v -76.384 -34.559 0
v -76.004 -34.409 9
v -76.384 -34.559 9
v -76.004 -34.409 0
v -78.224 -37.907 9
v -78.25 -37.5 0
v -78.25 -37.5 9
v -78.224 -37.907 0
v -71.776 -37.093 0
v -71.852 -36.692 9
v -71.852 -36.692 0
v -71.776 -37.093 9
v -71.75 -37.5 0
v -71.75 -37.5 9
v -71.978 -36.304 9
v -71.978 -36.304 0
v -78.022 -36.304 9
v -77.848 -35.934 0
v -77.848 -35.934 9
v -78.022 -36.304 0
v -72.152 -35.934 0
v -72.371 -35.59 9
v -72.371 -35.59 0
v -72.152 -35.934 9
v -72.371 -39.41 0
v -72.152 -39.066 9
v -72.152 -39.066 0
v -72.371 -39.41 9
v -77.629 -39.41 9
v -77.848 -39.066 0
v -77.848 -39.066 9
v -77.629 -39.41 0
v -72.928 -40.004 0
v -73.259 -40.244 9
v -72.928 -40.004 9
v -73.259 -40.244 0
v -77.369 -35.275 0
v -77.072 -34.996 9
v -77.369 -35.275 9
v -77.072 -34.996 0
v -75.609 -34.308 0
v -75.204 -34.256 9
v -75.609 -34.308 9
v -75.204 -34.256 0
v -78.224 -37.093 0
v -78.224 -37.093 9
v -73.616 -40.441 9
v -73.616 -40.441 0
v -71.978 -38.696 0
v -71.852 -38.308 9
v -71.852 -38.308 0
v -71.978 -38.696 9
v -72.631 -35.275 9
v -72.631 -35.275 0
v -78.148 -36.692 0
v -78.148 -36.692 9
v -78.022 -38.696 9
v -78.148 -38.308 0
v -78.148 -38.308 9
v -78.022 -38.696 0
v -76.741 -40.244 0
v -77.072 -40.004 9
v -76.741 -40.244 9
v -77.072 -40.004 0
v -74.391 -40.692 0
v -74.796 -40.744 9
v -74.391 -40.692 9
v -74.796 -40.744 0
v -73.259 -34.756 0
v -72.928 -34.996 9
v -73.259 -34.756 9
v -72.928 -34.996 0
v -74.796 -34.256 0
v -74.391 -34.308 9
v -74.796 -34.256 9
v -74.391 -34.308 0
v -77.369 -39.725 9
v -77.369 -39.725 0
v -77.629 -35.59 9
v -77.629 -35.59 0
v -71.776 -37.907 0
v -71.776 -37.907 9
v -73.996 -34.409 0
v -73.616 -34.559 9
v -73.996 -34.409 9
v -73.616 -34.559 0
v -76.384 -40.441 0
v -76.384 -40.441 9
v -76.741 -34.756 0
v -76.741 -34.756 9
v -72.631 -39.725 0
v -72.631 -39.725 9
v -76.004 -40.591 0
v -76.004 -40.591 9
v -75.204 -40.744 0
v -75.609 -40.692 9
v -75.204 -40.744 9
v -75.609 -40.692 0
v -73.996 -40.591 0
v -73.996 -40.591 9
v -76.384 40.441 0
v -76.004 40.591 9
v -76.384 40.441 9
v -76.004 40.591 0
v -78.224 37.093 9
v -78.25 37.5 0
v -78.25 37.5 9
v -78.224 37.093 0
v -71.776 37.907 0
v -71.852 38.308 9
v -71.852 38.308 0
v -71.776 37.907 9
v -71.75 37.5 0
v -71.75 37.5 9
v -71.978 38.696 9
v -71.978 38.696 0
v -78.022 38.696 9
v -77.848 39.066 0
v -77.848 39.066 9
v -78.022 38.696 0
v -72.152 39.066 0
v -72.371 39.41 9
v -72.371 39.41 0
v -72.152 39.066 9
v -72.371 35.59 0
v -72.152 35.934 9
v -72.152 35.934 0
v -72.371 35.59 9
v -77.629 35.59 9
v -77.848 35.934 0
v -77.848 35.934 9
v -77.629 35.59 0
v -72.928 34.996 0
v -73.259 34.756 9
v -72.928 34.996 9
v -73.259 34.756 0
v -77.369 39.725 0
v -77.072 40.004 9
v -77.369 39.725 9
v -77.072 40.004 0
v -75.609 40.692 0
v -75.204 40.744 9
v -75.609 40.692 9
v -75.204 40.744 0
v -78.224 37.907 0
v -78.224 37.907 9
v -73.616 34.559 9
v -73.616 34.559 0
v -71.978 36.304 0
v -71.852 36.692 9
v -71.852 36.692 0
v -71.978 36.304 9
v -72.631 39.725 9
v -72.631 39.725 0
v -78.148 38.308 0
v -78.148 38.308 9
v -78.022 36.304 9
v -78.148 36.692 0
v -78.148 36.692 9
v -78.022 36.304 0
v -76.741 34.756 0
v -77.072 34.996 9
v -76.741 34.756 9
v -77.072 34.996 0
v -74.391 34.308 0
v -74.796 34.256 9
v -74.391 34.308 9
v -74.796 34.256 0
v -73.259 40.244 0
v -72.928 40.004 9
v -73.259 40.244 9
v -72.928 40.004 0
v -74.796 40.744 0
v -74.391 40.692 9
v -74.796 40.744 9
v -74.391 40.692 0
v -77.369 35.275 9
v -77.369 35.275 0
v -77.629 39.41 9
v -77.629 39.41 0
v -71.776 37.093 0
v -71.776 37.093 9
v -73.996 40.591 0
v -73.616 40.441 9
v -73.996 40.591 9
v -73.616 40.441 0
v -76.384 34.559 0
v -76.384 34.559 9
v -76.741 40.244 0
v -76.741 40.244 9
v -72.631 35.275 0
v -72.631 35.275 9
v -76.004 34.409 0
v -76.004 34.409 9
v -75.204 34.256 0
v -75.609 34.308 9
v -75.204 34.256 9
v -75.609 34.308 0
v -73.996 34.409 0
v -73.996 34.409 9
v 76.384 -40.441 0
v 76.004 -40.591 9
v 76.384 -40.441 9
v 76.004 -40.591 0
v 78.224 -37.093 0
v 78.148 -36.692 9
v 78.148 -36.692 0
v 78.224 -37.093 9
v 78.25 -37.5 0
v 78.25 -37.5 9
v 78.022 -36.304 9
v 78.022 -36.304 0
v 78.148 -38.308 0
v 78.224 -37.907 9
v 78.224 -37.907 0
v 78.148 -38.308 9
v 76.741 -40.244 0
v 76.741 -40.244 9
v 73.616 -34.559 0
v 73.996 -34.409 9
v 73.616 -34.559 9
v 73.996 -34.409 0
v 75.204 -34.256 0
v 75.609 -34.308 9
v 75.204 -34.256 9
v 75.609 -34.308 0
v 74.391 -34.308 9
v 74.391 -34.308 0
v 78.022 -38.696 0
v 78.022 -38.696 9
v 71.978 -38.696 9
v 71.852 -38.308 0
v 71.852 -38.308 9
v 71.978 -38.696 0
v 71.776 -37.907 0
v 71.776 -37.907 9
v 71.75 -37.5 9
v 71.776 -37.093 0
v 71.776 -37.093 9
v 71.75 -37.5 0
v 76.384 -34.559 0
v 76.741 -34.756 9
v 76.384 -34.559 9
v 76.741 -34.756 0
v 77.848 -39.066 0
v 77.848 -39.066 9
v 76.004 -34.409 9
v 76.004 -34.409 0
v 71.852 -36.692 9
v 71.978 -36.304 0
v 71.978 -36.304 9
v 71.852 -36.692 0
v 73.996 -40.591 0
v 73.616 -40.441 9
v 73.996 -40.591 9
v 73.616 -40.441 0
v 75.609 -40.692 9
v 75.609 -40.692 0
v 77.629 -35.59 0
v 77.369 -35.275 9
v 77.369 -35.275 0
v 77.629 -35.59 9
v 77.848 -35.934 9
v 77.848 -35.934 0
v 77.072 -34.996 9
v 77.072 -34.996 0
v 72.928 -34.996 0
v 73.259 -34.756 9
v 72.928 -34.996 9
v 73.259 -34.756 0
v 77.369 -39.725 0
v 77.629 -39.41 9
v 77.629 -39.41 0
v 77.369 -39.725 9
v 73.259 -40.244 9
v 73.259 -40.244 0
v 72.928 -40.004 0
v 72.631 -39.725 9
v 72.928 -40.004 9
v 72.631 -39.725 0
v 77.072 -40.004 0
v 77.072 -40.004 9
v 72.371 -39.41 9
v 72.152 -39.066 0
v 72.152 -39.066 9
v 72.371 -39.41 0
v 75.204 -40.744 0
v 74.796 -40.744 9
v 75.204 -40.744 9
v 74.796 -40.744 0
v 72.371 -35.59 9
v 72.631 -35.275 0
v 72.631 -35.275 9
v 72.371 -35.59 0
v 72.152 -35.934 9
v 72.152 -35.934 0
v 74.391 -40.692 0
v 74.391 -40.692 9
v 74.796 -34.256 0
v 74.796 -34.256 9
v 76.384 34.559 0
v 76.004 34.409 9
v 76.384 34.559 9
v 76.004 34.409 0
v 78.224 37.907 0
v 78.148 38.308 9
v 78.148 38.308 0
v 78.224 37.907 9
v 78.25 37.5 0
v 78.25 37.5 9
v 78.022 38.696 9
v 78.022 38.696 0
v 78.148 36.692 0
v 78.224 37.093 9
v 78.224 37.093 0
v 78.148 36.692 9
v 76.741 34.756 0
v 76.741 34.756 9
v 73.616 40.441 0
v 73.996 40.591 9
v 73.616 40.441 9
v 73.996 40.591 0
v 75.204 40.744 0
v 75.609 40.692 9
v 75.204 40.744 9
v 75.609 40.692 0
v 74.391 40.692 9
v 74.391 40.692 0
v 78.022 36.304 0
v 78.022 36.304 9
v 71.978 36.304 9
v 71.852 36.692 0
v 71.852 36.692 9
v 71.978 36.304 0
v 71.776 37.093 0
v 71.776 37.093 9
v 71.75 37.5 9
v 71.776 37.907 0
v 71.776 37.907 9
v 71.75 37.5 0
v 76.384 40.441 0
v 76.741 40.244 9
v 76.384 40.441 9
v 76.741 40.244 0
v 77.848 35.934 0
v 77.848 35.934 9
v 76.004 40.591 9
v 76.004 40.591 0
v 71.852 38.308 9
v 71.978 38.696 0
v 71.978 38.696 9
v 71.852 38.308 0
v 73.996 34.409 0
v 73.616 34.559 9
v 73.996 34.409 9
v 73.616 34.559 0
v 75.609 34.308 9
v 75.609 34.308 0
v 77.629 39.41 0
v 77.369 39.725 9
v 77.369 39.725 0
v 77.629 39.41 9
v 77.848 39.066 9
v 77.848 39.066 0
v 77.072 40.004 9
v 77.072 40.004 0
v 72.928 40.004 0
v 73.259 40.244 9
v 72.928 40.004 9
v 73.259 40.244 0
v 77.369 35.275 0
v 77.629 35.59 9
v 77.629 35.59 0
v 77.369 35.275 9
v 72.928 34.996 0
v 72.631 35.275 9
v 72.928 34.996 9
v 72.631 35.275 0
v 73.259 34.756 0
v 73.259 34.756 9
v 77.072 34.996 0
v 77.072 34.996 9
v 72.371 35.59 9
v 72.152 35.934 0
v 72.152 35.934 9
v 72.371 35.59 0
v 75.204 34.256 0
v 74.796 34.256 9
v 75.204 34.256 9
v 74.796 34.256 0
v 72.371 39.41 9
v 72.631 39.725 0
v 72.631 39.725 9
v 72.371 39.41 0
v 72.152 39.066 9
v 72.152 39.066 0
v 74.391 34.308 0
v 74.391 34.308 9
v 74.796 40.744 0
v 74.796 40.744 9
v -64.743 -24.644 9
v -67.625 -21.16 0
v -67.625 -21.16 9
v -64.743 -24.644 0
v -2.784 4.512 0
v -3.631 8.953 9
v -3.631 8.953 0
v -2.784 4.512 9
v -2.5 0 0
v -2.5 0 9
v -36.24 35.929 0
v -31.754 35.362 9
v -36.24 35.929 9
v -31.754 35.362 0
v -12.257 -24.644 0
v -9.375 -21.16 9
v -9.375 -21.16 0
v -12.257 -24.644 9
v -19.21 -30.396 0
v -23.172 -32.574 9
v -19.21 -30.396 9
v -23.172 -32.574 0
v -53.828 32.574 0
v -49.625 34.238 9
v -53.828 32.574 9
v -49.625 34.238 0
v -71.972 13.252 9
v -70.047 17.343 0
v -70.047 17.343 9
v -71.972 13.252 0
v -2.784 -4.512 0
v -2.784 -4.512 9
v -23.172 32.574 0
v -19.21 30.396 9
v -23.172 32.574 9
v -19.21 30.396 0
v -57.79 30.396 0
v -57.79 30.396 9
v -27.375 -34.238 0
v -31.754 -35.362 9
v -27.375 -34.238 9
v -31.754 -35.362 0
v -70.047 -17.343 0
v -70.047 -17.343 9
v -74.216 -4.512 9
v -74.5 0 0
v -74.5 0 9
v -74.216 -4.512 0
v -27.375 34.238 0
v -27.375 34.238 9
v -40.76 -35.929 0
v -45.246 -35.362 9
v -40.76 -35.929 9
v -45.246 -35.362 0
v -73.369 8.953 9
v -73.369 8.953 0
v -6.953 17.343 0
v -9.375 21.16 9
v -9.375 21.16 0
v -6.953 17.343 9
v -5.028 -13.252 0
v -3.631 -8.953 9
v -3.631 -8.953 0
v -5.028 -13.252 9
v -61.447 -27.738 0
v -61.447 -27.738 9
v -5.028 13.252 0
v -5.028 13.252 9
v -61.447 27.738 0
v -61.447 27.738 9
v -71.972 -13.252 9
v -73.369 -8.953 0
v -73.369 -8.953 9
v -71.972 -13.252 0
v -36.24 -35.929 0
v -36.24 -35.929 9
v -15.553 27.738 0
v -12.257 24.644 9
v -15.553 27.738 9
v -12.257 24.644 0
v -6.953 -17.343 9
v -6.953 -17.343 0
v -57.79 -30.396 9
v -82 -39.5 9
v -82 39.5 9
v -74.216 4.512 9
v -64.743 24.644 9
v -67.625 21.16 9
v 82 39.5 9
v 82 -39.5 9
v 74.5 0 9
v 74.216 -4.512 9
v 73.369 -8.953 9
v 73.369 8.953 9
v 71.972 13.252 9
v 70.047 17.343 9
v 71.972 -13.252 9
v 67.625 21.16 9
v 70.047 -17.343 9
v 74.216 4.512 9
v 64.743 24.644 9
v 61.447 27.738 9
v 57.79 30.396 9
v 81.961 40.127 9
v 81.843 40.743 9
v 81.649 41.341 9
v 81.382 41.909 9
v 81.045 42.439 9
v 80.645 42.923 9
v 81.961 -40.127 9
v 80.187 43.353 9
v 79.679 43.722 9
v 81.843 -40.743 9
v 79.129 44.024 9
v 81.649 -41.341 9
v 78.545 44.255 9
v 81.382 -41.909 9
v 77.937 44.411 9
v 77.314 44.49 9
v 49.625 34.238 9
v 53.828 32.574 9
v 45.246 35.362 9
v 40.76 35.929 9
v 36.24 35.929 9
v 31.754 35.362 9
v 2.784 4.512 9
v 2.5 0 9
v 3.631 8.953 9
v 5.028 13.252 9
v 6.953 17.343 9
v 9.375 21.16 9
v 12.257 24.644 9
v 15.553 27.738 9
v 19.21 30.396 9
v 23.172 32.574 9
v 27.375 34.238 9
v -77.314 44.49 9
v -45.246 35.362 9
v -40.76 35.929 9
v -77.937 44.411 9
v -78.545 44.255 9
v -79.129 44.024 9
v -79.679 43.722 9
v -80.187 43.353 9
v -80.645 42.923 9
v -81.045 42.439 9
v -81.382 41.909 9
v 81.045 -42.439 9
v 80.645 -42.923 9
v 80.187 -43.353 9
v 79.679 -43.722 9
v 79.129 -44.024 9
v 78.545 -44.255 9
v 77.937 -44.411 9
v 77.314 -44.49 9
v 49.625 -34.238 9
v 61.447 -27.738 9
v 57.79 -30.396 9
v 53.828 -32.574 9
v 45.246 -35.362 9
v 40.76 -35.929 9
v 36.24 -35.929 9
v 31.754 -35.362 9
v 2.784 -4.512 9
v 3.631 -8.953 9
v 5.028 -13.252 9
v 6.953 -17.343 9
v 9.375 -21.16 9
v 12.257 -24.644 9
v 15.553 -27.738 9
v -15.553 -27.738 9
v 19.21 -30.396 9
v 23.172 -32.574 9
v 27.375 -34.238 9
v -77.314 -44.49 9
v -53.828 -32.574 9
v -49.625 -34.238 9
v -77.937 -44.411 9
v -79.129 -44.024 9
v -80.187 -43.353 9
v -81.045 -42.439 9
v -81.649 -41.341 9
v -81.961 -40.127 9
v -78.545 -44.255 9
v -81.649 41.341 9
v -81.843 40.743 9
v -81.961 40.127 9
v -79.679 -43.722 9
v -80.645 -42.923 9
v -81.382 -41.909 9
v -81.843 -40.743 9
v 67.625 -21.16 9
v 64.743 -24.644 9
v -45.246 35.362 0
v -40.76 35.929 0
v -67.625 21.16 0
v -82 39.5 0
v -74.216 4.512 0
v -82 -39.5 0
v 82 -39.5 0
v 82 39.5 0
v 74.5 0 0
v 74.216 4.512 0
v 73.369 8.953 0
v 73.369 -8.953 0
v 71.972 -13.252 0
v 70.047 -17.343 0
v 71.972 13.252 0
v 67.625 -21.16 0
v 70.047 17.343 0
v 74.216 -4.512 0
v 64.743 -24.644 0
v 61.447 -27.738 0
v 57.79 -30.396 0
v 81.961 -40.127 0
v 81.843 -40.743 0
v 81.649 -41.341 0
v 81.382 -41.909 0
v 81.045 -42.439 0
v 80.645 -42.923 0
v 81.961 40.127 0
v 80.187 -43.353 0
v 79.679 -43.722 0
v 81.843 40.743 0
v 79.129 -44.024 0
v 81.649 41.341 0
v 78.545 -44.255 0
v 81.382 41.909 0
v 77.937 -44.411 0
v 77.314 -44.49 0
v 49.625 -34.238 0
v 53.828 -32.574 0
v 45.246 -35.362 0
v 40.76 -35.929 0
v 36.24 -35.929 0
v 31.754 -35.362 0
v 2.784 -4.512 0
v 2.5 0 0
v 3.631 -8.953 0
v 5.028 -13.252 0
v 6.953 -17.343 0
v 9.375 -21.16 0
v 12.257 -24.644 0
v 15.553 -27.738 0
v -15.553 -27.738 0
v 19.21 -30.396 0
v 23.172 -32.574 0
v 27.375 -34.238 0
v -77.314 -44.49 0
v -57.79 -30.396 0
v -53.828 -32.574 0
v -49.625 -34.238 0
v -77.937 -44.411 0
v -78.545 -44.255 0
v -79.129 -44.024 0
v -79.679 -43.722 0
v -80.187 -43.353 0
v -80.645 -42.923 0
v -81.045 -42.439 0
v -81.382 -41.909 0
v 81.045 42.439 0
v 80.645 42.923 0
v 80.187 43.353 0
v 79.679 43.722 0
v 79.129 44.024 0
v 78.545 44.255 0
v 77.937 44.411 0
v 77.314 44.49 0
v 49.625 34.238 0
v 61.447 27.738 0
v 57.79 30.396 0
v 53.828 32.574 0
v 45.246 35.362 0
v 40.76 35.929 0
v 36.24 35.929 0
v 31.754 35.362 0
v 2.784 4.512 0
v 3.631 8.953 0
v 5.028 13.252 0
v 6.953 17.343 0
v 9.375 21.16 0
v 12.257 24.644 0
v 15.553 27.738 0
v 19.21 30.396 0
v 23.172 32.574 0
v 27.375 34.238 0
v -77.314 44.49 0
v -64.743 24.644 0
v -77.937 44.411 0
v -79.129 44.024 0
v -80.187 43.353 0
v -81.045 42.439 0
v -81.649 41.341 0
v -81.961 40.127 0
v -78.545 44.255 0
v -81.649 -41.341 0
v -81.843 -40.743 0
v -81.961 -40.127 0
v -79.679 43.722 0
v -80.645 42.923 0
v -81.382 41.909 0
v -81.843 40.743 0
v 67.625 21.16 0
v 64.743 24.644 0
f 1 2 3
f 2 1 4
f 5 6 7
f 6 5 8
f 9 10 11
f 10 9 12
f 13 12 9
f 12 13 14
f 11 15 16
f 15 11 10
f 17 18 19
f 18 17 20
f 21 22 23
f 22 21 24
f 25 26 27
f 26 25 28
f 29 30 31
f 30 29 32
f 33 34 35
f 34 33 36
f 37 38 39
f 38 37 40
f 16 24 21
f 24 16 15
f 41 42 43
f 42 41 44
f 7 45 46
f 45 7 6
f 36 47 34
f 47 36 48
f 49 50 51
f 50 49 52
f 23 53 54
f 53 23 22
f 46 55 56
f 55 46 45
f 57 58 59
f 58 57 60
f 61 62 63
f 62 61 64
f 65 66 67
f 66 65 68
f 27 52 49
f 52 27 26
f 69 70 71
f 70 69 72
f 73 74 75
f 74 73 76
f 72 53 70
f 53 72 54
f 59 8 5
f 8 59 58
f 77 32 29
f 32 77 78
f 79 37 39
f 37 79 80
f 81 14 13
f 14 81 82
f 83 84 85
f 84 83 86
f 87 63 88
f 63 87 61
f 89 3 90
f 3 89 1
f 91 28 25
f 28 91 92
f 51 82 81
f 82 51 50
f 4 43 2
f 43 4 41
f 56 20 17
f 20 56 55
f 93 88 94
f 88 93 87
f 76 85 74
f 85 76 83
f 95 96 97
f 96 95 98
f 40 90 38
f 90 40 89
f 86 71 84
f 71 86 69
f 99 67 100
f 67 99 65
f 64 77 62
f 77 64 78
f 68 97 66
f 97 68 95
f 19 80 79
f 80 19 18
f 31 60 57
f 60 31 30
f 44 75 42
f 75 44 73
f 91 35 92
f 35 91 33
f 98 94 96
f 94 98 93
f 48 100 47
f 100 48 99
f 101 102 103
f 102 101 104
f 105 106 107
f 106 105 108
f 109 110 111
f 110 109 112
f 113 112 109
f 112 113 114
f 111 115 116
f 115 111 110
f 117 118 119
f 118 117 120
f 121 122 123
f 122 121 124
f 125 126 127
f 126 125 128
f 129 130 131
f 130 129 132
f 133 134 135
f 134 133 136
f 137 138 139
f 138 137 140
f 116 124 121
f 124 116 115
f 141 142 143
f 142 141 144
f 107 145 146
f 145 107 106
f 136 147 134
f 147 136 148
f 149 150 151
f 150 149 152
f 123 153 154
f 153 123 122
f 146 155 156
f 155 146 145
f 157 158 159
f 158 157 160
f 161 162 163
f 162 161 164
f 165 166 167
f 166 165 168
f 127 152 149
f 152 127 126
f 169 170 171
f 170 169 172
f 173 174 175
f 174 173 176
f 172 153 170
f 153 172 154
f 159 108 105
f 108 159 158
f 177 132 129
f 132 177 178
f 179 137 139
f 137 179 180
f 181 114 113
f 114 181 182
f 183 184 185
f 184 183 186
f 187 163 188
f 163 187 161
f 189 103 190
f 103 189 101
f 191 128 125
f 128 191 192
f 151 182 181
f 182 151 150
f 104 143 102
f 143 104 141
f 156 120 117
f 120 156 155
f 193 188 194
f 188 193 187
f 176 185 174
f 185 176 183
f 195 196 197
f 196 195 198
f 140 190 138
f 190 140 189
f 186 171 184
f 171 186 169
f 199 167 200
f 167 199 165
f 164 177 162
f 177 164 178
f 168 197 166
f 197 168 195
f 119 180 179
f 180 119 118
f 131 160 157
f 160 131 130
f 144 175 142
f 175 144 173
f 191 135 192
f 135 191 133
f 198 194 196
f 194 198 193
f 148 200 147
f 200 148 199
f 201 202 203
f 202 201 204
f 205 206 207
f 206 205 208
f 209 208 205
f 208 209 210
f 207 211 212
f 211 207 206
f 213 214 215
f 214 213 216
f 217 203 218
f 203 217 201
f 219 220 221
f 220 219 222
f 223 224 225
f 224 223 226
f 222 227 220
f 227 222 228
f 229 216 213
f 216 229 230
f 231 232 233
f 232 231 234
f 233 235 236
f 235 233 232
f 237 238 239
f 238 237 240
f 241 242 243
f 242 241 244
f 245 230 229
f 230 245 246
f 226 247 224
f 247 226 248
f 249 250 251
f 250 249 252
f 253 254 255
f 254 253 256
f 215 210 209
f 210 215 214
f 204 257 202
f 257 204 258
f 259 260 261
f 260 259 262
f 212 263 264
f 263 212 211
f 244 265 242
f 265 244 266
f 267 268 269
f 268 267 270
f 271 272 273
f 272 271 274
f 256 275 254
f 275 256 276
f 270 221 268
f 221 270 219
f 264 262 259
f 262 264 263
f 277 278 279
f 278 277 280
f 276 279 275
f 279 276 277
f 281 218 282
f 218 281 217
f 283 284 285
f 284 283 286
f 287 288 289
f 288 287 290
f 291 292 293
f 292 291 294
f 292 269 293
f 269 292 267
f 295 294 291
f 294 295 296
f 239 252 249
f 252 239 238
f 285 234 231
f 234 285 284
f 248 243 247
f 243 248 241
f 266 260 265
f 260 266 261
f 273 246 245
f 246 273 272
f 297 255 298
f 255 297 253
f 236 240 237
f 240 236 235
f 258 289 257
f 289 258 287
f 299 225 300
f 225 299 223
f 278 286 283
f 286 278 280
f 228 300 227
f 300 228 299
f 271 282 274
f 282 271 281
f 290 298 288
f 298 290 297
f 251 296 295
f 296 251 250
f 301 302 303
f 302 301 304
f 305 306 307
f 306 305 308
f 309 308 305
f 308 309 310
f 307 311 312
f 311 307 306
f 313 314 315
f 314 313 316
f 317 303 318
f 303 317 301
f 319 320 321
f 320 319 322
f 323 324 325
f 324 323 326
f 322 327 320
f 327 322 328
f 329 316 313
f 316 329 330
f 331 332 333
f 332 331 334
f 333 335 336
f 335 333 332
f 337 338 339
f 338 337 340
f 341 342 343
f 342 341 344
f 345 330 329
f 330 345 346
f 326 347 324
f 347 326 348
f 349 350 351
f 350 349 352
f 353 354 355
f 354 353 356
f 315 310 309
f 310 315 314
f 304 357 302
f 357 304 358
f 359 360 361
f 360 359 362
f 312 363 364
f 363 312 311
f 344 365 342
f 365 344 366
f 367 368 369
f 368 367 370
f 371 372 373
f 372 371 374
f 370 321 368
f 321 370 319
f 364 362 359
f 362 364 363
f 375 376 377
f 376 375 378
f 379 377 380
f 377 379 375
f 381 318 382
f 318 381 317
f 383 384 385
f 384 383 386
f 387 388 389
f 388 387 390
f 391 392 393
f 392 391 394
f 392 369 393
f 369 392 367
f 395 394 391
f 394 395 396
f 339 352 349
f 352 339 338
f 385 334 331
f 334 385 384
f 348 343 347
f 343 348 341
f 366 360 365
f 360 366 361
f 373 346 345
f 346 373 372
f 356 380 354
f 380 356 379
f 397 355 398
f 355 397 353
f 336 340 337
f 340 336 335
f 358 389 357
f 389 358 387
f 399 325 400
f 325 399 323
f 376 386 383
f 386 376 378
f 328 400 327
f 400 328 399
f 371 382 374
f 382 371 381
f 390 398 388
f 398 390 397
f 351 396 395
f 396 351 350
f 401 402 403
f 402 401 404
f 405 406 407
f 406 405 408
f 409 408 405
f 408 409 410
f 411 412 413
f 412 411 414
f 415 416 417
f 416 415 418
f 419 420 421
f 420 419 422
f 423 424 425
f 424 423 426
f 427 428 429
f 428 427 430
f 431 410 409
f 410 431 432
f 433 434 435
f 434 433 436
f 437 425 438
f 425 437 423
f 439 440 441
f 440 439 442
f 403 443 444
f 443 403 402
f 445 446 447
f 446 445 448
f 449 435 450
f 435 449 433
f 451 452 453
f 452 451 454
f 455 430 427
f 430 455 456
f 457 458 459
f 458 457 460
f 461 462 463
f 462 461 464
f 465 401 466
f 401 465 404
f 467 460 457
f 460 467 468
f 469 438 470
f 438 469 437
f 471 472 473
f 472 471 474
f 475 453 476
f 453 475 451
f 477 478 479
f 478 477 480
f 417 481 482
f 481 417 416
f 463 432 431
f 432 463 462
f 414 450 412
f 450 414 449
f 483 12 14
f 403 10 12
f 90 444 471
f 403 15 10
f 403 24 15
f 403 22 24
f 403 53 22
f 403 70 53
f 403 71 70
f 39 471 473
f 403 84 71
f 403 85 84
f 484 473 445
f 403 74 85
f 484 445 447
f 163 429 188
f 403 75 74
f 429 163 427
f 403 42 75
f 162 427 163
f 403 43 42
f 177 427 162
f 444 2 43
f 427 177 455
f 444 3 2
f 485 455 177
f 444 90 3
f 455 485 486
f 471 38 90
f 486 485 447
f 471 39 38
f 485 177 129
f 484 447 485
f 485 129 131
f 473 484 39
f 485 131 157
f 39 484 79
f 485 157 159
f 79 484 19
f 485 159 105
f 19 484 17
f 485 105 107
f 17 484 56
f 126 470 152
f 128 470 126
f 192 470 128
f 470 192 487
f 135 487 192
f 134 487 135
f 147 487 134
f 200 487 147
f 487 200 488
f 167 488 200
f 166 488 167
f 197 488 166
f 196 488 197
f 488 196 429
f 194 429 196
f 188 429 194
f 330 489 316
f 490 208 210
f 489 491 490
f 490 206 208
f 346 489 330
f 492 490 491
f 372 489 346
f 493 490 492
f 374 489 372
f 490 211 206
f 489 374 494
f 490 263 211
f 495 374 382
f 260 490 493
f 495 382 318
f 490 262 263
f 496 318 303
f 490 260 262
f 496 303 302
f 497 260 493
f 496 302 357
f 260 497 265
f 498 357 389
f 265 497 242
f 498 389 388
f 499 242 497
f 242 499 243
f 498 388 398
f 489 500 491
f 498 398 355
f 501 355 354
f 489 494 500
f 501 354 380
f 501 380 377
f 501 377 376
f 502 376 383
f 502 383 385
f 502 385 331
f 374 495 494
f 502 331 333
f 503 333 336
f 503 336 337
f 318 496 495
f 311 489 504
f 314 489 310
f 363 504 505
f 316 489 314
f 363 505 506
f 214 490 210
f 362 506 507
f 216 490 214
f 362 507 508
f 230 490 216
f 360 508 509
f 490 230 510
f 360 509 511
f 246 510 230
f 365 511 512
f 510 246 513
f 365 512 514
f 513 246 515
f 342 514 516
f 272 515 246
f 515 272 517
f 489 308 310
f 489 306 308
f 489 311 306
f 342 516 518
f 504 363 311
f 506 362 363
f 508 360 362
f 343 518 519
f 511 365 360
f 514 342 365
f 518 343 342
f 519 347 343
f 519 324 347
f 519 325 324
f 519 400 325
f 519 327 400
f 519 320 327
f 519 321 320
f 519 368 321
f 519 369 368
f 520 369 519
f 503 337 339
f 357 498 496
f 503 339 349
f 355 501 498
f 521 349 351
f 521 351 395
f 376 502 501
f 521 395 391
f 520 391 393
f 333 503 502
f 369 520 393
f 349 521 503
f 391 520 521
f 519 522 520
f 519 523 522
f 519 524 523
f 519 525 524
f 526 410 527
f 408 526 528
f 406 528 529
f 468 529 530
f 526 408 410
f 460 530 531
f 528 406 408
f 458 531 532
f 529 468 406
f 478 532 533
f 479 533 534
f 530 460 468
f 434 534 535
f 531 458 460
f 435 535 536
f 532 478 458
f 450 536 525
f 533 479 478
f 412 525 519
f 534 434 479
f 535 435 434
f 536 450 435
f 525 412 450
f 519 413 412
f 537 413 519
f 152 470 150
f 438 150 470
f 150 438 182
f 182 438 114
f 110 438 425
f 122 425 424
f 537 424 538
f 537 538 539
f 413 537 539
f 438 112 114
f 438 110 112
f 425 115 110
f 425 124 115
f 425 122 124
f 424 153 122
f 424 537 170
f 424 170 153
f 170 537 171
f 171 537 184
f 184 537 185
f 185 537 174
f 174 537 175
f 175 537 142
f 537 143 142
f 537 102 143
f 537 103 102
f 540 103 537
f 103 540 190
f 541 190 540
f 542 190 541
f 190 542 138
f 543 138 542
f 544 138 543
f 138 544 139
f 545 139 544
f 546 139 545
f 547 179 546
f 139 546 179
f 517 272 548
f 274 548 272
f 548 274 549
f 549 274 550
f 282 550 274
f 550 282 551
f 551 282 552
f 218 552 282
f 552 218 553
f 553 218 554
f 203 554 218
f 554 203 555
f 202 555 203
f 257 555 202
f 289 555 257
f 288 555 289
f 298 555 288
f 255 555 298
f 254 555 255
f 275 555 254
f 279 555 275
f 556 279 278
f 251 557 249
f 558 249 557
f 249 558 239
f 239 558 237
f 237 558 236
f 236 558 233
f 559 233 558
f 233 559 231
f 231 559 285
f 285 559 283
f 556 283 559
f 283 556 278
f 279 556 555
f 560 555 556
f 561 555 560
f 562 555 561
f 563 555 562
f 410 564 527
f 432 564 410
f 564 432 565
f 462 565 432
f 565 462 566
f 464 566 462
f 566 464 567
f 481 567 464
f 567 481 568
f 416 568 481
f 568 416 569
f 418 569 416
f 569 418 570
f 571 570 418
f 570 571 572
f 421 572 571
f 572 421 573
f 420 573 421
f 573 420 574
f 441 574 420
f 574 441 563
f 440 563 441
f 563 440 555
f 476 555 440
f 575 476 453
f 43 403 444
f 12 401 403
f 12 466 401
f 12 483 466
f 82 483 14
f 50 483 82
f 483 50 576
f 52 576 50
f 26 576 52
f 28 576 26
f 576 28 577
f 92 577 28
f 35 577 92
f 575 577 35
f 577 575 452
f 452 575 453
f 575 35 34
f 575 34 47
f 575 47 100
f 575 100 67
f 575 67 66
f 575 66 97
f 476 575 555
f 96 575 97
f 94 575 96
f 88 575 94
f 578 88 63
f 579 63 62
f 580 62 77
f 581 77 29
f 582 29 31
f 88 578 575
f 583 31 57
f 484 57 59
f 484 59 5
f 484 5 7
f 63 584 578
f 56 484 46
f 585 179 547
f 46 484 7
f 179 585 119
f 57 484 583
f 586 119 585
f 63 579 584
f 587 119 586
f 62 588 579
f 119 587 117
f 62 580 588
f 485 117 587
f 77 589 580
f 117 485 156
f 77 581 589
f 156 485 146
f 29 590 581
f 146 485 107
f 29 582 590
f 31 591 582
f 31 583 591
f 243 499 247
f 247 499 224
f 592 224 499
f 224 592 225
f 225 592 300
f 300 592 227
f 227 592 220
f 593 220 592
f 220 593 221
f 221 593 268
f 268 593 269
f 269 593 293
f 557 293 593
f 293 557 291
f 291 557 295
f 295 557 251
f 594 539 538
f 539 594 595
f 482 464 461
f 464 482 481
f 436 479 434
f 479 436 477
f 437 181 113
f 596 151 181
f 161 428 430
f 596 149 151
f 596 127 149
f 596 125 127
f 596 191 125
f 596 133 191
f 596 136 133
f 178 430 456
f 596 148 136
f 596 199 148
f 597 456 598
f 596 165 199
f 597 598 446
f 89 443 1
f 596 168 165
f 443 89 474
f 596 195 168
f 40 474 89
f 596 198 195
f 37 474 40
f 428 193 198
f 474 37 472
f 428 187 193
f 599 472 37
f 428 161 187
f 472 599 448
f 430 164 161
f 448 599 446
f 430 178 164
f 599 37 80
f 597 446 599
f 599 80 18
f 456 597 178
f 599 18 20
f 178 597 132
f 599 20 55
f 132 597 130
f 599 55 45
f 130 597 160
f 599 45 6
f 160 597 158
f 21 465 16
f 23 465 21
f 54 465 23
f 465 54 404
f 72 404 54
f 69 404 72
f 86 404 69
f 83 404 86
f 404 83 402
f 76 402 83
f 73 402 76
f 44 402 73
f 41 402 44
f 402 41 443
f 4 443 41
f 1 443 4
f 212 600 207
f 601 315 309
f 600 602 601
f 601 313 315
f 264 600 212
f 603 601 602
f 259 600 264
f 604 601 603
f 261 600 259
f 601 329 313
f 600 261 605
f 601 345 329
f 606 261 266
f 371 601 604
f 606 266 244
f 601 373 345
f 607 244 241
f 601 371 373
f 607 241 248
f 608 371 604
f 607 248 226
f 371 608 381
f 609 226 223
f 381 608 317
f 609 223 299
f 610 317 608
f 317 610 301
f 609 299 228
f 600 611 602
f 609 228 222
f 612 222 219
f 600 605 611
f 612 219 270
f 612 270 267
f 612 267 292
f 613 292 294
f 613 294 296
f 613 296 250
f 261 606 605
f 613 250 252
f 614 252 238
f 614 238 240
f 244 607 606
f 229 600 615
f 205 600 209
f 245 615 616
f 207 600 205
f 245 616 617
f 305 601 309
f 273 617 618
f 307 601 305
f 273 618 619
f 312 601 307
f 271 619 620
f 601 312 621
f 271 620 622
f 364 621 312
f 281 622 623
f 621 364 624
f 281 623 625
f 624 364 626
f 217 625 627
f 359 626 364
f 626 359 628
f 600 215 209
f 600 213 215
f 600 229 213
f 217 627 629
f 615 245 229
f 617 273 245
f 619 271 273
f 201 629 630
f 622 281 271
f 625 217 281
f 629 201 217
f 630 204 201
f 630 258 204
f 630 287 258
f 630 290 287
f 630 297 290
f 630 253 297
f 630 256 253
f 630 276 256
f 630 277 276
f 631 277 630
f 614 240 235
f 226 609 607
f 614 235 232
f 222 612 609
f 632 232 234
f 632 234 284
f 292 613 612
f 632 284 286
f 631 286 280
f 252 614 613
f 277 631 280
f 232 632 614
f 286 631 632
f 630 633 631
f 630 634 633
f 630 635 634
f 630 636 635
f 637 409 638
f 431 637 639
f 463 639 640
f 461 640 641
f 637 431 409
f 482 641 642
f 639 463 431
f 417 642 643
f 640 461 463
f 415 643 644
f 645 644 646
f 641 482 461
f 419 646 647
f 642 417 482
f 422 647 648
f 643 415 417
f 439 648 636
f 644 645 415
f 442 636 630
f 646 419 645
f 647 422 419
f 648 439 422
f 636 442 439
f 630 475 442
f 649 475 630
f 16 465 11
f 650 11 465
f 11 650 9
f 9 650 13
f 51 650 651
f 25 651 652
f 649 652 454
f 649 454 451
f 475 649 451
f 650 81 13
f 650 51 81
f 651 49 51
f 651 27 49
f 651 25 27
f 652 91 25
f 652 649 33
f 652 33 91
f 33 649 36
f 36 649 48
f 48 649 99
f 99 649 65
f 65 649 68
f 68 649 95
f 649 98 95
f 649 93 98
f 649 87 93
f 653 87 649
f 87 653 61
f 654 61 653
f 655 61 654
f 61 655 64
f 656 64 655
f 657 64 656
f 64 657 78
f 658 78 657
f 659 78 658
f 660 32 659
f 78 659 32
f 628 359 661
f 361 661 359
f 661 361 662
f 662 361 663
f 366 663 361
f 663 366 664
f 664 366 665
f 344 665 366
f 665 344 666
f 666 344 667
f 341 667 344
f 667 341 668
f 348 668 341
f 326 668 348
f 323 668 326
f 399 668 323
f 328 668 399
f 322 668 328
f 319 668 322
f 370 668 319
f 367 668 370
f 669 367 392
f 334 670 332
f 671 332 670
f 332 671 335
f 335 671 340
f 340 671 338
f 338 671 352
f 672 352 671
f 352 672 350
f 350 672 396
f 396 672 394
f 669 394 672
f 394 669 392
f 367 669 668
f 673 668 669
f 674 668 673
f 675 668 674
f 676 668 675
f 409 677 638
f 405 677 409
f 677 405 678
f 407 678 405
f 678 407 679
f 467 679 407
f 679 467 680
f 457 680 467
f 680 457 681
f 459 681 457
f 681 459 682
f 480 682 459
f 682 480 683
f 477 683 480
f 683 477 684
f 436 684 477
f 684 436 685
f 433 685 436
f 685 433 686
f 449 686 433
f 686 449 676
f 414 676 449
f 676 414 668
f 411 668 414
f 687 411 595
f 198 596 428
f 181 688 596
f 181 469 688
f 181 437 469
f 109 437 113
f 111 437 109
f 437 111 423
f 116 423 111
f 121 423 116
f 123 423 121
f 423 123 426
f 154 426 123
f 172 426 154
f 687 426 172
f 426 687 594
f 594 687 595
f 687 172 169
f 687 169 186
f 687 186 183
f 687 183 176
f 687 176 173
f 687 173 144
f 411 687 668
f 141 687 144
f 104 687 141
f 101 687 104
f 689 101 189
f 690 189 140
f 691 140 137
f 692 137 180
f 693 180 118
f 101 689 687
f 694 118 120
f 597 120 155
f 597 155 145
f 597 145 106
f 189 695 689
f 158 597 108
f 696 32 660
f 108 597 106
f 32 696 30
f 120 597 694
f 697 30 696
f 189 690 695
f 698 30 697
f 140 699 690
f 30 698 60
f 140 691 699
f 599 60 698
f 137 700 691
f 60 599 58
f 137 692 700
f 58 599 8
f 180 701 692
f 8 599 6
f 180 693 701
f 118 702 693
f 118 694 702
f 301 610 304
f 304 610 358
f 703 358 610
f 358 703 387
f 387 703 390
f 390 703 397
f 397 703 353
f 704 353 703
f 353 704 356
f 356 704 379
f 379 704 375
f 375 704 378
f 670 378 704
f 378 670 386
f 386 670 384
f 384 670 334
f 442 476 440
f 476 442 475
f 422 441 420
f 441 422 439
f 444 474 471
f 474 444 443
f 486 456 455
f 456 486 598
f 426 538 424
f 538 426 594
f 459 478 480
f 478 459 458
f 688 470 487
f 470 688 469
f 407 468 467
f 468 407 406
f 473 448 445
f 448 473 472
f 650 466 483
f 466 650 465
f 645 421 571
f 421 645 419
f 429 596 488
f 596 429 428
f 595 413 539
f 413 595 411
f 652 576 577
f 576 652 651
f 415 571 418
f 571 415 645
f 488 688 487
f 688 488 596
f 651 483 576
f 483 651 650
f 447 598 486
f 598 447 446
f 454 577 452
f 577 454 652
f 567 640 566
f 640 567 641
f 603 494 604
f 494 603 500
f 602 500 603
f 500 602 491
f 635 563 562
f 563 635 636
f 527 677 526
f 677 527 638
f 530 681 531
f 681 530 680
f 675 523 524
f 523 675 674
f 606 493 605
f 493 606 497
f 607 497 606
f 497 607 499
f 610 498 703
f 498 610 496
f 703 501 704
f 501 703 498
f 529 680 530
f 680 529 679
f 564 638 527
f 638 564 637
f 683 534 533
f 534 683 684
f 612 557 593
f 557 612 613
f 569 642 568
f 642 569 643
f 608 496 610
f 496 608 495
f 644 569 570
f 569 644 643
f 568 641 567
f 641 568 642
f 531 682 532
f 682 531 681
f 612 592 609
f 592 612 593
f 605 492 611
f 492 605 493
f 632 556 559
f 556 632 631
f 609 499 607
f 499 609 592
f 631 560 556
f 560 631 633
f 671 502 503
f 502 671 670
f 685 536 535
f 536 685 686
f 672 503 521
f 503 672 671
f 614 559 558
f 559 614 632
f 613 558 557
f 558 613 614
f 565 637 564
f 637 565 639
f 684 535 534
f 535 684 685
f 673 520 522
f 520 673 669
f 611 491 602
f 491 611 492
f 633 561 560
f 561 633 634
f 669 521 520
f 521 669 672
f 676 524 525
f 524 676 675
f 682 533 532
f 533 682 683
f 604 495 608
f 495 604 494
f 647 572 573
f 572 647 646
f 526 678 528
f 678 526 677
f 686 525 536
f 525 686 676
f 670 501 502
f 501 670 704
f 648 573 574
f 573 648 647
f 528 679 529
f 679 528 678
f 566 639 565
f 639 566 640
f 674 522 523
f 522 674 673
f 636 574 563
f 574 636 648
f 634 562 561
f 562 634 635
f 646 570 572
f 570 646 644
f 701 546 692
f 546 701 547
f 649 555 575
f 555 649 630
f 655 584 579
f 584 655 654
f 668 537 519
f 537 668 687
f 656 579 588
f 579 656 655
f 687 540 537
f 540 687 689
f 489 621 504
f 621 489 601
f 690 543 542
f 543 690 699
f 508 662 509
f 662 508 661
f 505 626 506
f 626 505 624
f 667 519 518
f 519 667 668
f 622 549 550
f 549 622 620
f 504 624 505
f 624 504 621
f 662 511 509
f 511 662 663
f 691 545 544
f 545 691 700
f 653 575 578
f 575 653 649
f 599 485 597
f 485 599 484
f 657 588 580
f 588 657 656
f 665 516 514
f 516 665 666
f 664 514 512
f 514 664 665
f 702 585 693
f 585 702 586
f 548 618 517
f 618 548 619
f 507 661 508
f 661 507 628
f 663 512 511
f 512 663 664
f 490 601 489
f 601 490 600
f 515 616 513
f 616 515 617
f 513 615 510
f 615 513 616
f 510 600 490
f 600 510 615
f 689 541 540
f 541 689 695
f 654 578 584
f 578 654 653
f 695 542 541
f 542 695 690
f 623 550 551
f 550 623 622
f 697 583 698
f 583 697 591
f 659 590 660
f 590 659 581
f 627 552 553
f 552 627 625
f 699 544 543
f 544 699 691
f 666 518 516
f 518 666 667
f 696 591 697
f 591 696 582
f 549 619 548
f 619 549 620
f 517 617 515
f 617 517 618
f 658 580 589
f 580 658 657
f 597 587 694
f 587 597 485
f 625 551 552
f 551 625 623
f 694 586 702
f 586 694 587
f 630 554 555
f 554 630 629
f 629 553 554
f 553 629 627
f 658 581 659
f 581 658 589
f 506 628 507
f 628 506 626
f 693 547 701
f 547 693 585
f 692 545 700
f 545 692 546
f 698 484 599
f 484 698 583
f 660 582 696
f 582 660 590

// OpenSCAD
$fn = 50;


difference() {
	union() {
		hull() {
			translate(v = [-77.0000000000, 39.5000000000, 0]) {
				cylinder(h = 9, r = 5);
			}
			translate(v = [77.0000000000, 39.5000000000, 0]) {
				cylinder(h = 9, r = 5);
			}
			translate(v = [-77.0000000000, -39.5000000000, 0]) {
				cylinder(h = 9, r = 5);
			}
			translate(v = [77.0000000000, -39.5000000000, 0]) {
				cylinder(h = 9, r = 5);
			}
		}
	}
	union() {
		#translate(v = [-75.0000000000, -37.5000000000, -100.0000000000]) {
			cylinder(h = 200, r = 3.2500000000);
		}
		#translate(v = [-75.0000000000, 37.5000000000, -100.0000000000]) {
			cylinder(h = 200, r = 3.2500000000);
		}
		#translate(v = [75.0000000000, -37.5000000000, -100.0000000000]) {
			cylinder(h = 200, r = 3.2500000000);
		}
		#translate(v = [75.0000000000, 37.5000000000, -100.0000000000]) {
			cylinder(h = 200, r = 3.2500000000);
		}
		#translate(v = [-38.5000000000, 0, 0]) {
			cylinder(h = 9, r = 36.0000000000);
		}
		#translate(v = [38.5000000000, 0, 0]) {
			cylinder(h = 9, r = 36.0000000000);
		}
	}
}
